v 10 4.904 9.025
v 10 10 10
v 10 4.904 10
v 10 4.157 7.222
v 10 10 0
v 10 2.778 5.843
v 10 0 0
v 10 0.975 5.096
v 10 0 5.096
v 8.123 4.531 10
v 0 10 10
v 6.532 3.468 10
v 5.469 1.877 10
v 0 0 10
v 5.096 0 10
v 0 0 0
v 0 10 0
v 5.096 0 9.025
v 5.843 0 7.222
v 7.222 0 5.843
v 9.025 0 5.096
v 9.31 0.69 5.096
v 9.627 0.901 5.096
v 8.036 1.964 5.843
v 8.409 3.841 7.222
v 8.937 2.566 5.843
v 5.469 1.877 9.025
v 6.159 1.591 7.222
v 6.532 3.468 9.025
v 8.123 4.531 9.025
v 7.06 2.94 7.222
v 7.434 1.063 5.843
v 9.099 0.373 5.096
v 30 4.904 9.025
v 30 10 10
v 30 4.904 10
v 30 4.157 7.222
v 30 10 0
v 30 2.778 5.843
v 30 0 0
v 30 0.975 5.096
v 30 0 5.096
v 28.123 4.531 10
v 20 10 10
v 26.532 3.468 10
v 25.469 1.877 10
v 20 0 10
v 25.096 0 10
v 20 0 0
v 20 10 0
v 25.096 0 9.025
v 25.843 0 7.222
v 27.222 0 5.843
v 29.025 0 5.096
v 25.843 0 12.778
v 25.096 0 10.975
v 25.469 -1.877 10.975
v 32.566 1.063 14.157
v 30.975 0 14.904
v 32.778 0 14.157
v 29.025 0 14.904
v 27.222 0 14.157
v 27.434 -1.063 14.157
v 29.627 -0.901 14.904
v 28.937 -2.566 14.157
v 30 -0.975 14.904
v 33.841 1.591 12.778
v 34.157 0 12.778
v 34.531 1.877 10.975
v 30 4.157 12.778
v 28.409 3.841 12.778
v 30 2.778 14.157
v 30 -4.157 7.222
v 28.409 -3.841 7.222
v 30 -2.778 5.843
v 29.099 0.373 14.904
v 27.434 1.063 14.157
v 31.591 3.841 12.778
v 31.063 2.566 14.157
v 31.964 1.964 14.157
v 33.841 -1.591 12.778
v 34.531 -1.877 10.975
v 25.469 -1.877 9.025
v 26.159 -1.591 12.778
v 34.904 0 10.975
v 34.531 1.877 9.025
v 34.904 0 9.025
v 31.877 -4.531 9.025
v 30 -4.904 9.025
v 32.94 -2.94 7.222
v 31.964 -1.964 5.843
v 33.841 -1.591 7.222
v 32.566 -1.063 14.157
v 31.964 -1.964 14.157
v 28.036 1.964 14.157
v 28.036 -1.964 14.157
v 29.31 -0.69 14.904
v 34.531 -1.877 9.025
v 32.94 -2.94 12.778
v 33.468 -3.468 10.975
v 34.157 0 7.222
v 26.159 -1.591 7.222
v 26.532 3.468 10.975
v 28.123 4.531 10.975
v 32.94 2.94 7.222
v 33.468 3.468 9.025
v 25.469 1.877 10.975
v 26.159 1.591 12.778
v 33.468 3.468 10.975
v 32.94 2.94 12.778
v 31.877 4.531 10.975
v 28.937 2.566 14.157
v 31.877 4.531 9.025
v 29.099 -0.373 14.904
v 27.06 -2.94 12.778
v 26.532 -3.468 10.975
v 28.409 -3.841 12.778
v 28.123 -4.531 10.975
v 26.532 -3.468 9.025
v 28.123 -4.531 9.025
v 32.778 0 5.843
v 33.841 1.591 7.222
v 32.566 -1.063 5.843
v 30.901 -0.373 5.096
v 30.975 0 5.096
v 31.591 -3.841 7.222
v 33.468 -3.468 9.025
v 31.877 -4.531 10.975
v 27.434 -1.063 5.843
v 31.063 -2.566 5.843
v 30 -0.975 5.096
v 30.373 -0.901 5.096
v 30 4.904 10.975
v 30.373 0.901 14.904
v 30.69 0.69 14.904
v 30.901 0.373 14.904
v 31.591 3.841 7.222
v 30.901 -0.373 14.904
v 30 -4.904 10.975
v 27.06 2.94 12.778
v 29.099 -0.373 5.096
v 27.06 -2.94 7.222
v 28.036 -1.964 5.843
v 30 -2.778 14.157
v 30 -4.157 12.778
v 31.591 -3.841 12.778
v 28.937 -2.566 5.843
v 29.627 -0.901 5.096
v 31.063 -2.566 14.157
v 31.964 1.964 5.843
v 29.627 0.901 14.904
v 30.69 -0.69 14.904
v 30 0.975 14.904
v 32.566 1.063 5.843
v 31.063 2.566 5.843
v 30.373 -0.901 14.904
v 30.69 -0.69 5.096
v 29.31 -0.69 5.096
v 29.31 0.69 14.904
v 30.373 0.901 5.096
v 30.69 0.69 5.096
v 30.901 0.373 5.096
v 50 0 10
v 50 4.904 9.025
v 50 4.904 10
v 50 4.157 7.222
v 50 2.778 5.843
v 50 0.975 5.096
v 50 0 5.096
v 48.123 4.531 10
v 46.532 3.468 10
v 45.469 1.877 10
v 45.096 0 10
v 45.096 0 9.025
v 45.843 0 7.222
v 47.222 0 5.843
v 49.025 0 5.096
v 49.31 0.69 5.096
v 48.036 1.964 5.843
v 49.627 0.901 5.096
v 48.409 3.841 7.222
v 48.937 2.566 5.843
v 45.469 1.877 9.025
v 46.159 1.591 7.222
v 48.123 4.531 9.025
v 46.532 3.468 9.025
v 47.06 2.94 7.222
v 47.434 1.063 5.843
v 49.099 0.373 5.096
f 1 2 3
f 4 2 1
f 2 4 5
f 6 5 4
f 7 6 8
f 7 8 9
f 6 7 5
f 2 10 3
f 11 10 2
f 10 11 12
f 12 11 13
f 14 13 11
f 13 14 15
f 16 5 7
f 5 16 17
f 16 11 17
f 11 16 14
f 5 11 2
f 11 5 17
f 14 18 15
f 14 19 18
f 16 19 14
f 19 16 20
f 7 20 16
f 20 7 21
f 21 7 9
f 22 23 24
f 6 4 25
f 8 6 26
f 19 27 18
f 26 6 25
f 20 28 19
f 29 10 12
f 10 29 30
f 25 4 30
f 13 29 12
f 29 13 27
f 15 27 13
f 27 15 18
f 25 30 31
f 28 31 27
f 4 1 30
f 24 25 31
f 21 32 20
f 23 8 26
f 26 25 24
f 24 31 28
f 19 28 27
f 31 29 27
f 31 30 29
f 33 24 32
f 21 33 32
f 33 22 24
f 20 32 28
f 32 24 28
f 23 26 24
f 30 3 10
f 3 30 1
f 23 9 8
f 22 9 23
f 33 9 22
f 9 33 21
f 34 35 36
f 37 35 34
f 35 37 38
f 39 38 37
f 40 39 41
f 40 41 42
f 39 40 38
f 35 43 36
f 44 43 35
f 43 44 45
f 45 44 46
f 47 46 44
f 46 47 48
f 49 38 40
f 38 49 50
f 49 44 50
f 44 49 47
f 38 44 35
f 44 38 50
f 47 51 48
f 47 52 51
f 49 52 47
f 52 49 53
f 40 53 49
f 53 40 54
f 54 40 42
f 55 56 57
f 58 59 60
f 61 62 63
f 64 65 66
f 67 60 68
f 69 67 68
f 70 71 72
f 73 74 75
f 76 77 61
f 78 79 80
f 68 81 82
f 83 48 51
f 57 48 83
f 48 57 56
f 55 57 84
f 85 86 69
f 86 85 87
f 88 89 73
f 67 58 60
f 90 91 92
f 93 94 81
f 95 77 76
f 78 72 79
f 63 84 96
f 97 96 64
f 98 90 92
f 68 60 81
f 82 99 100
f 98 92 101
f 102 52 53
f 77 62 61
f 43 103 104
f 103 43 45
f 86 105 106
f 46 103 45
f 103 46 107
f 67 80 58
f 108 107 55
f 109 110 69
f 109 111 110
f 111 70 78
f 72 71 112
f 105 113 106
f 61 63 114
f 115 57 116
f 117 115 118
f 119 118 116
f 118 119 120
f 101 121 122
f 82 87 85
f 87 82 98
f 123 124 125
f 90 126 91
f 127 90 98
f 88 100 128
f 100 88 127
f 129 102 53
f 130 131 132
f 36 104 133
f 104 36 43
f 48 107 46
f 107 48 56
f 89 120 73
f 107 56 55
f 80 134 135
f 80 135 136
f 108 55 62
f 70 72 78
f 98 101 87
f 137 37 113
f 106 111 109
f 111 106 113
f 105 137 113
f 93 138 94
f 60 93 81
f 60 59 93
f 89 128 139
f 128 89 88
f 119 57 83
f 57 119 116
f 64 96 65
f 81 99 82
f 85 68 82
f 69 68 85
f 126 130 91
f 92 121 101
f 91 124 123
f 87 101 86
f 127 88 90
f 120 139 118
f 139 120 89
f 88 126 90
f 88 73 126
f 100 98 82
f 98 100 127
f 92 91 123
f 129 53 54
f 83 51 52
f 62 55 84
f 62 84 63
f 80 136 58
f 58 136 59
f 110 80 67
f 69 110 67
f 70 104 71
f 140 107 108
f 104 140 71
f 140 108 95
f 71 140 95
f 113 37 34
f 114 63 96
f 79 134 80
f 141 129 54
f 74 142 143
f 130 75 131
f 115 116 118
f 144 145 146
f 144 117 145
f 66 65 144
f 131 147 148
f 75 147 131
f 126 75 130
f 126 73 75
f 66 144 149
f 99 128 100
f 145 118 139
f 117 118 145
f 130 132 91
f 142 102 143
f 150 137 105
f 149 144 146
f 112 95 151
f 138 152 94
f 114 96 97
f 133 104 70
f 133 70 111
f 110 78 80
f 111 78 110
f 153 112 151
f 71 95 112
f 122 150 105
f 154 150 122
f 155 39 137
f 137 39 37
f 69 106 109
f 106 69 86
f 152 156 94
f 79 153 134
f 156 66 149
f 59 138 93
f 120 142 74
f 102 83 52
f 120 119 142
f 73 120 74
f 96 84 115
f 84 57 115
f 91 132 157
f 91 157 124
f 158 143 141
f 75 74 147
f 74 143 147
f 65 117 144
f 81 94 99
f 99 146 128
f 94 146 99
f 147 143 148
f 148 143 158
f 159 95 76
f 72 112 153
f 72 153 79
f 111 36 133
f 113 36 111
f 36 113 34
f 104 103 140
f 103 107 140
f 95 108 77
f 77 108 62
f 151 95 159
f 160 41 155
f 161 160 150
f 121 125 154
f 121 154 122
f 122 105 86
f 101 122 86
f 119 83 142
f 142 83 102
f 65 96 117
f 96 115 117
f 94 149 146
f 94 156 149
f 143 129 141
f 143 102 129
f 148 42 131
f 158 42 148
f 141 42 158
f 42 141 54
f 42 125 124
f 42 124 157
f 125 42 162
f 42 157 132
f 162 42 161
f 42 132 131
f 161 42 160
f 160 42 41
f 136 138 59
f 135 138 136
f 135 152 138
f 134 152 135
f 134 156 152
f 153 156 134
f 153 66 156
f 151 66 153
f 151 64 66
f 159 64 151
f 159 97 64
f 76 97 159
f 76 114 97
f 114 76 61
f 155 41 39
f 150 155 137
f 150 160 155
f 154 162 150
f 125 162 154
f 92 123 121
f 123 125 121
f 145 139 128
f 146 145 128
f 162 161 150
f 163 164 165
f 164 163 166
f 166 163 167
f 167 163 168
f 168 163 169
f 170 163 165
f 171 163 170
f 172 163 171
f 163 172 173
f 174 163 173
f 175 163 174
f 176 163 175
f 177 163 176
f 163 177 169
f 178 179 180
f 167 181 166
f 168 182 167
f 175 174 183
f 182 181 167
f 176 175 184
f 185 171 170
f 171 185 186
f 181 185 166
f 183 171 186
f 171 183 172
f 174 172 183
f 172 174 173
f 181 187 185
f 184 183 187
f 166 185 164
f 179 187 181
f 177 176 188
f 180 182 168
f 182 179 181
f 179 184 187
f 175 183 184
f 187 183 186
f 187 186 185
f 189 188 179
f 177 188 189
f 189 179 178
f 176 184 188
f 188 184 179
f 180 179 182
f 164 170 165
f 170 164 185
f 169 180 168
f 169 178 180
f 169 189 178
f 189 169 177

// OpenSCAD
difference ()
{
    color([1,0,0])
    cube ([10,10,10]);

    color([0,0,1])
    translate ([10,0,10])
    sphere (r=5);
}

translate ([20,0,0])
union()
{
    color([1,0,0])
    cube ([10,10,10]);

    color([0,0,1])
    translate ([10,0,10])
    sphere (r=5);
}

translate ([40,0,0])
intersection()
{
    color([1,0,0])
    cube ([10,10,10]);

    color([0,0,1])
    translate ([10,0,10])
    sphere (r=5);
}
